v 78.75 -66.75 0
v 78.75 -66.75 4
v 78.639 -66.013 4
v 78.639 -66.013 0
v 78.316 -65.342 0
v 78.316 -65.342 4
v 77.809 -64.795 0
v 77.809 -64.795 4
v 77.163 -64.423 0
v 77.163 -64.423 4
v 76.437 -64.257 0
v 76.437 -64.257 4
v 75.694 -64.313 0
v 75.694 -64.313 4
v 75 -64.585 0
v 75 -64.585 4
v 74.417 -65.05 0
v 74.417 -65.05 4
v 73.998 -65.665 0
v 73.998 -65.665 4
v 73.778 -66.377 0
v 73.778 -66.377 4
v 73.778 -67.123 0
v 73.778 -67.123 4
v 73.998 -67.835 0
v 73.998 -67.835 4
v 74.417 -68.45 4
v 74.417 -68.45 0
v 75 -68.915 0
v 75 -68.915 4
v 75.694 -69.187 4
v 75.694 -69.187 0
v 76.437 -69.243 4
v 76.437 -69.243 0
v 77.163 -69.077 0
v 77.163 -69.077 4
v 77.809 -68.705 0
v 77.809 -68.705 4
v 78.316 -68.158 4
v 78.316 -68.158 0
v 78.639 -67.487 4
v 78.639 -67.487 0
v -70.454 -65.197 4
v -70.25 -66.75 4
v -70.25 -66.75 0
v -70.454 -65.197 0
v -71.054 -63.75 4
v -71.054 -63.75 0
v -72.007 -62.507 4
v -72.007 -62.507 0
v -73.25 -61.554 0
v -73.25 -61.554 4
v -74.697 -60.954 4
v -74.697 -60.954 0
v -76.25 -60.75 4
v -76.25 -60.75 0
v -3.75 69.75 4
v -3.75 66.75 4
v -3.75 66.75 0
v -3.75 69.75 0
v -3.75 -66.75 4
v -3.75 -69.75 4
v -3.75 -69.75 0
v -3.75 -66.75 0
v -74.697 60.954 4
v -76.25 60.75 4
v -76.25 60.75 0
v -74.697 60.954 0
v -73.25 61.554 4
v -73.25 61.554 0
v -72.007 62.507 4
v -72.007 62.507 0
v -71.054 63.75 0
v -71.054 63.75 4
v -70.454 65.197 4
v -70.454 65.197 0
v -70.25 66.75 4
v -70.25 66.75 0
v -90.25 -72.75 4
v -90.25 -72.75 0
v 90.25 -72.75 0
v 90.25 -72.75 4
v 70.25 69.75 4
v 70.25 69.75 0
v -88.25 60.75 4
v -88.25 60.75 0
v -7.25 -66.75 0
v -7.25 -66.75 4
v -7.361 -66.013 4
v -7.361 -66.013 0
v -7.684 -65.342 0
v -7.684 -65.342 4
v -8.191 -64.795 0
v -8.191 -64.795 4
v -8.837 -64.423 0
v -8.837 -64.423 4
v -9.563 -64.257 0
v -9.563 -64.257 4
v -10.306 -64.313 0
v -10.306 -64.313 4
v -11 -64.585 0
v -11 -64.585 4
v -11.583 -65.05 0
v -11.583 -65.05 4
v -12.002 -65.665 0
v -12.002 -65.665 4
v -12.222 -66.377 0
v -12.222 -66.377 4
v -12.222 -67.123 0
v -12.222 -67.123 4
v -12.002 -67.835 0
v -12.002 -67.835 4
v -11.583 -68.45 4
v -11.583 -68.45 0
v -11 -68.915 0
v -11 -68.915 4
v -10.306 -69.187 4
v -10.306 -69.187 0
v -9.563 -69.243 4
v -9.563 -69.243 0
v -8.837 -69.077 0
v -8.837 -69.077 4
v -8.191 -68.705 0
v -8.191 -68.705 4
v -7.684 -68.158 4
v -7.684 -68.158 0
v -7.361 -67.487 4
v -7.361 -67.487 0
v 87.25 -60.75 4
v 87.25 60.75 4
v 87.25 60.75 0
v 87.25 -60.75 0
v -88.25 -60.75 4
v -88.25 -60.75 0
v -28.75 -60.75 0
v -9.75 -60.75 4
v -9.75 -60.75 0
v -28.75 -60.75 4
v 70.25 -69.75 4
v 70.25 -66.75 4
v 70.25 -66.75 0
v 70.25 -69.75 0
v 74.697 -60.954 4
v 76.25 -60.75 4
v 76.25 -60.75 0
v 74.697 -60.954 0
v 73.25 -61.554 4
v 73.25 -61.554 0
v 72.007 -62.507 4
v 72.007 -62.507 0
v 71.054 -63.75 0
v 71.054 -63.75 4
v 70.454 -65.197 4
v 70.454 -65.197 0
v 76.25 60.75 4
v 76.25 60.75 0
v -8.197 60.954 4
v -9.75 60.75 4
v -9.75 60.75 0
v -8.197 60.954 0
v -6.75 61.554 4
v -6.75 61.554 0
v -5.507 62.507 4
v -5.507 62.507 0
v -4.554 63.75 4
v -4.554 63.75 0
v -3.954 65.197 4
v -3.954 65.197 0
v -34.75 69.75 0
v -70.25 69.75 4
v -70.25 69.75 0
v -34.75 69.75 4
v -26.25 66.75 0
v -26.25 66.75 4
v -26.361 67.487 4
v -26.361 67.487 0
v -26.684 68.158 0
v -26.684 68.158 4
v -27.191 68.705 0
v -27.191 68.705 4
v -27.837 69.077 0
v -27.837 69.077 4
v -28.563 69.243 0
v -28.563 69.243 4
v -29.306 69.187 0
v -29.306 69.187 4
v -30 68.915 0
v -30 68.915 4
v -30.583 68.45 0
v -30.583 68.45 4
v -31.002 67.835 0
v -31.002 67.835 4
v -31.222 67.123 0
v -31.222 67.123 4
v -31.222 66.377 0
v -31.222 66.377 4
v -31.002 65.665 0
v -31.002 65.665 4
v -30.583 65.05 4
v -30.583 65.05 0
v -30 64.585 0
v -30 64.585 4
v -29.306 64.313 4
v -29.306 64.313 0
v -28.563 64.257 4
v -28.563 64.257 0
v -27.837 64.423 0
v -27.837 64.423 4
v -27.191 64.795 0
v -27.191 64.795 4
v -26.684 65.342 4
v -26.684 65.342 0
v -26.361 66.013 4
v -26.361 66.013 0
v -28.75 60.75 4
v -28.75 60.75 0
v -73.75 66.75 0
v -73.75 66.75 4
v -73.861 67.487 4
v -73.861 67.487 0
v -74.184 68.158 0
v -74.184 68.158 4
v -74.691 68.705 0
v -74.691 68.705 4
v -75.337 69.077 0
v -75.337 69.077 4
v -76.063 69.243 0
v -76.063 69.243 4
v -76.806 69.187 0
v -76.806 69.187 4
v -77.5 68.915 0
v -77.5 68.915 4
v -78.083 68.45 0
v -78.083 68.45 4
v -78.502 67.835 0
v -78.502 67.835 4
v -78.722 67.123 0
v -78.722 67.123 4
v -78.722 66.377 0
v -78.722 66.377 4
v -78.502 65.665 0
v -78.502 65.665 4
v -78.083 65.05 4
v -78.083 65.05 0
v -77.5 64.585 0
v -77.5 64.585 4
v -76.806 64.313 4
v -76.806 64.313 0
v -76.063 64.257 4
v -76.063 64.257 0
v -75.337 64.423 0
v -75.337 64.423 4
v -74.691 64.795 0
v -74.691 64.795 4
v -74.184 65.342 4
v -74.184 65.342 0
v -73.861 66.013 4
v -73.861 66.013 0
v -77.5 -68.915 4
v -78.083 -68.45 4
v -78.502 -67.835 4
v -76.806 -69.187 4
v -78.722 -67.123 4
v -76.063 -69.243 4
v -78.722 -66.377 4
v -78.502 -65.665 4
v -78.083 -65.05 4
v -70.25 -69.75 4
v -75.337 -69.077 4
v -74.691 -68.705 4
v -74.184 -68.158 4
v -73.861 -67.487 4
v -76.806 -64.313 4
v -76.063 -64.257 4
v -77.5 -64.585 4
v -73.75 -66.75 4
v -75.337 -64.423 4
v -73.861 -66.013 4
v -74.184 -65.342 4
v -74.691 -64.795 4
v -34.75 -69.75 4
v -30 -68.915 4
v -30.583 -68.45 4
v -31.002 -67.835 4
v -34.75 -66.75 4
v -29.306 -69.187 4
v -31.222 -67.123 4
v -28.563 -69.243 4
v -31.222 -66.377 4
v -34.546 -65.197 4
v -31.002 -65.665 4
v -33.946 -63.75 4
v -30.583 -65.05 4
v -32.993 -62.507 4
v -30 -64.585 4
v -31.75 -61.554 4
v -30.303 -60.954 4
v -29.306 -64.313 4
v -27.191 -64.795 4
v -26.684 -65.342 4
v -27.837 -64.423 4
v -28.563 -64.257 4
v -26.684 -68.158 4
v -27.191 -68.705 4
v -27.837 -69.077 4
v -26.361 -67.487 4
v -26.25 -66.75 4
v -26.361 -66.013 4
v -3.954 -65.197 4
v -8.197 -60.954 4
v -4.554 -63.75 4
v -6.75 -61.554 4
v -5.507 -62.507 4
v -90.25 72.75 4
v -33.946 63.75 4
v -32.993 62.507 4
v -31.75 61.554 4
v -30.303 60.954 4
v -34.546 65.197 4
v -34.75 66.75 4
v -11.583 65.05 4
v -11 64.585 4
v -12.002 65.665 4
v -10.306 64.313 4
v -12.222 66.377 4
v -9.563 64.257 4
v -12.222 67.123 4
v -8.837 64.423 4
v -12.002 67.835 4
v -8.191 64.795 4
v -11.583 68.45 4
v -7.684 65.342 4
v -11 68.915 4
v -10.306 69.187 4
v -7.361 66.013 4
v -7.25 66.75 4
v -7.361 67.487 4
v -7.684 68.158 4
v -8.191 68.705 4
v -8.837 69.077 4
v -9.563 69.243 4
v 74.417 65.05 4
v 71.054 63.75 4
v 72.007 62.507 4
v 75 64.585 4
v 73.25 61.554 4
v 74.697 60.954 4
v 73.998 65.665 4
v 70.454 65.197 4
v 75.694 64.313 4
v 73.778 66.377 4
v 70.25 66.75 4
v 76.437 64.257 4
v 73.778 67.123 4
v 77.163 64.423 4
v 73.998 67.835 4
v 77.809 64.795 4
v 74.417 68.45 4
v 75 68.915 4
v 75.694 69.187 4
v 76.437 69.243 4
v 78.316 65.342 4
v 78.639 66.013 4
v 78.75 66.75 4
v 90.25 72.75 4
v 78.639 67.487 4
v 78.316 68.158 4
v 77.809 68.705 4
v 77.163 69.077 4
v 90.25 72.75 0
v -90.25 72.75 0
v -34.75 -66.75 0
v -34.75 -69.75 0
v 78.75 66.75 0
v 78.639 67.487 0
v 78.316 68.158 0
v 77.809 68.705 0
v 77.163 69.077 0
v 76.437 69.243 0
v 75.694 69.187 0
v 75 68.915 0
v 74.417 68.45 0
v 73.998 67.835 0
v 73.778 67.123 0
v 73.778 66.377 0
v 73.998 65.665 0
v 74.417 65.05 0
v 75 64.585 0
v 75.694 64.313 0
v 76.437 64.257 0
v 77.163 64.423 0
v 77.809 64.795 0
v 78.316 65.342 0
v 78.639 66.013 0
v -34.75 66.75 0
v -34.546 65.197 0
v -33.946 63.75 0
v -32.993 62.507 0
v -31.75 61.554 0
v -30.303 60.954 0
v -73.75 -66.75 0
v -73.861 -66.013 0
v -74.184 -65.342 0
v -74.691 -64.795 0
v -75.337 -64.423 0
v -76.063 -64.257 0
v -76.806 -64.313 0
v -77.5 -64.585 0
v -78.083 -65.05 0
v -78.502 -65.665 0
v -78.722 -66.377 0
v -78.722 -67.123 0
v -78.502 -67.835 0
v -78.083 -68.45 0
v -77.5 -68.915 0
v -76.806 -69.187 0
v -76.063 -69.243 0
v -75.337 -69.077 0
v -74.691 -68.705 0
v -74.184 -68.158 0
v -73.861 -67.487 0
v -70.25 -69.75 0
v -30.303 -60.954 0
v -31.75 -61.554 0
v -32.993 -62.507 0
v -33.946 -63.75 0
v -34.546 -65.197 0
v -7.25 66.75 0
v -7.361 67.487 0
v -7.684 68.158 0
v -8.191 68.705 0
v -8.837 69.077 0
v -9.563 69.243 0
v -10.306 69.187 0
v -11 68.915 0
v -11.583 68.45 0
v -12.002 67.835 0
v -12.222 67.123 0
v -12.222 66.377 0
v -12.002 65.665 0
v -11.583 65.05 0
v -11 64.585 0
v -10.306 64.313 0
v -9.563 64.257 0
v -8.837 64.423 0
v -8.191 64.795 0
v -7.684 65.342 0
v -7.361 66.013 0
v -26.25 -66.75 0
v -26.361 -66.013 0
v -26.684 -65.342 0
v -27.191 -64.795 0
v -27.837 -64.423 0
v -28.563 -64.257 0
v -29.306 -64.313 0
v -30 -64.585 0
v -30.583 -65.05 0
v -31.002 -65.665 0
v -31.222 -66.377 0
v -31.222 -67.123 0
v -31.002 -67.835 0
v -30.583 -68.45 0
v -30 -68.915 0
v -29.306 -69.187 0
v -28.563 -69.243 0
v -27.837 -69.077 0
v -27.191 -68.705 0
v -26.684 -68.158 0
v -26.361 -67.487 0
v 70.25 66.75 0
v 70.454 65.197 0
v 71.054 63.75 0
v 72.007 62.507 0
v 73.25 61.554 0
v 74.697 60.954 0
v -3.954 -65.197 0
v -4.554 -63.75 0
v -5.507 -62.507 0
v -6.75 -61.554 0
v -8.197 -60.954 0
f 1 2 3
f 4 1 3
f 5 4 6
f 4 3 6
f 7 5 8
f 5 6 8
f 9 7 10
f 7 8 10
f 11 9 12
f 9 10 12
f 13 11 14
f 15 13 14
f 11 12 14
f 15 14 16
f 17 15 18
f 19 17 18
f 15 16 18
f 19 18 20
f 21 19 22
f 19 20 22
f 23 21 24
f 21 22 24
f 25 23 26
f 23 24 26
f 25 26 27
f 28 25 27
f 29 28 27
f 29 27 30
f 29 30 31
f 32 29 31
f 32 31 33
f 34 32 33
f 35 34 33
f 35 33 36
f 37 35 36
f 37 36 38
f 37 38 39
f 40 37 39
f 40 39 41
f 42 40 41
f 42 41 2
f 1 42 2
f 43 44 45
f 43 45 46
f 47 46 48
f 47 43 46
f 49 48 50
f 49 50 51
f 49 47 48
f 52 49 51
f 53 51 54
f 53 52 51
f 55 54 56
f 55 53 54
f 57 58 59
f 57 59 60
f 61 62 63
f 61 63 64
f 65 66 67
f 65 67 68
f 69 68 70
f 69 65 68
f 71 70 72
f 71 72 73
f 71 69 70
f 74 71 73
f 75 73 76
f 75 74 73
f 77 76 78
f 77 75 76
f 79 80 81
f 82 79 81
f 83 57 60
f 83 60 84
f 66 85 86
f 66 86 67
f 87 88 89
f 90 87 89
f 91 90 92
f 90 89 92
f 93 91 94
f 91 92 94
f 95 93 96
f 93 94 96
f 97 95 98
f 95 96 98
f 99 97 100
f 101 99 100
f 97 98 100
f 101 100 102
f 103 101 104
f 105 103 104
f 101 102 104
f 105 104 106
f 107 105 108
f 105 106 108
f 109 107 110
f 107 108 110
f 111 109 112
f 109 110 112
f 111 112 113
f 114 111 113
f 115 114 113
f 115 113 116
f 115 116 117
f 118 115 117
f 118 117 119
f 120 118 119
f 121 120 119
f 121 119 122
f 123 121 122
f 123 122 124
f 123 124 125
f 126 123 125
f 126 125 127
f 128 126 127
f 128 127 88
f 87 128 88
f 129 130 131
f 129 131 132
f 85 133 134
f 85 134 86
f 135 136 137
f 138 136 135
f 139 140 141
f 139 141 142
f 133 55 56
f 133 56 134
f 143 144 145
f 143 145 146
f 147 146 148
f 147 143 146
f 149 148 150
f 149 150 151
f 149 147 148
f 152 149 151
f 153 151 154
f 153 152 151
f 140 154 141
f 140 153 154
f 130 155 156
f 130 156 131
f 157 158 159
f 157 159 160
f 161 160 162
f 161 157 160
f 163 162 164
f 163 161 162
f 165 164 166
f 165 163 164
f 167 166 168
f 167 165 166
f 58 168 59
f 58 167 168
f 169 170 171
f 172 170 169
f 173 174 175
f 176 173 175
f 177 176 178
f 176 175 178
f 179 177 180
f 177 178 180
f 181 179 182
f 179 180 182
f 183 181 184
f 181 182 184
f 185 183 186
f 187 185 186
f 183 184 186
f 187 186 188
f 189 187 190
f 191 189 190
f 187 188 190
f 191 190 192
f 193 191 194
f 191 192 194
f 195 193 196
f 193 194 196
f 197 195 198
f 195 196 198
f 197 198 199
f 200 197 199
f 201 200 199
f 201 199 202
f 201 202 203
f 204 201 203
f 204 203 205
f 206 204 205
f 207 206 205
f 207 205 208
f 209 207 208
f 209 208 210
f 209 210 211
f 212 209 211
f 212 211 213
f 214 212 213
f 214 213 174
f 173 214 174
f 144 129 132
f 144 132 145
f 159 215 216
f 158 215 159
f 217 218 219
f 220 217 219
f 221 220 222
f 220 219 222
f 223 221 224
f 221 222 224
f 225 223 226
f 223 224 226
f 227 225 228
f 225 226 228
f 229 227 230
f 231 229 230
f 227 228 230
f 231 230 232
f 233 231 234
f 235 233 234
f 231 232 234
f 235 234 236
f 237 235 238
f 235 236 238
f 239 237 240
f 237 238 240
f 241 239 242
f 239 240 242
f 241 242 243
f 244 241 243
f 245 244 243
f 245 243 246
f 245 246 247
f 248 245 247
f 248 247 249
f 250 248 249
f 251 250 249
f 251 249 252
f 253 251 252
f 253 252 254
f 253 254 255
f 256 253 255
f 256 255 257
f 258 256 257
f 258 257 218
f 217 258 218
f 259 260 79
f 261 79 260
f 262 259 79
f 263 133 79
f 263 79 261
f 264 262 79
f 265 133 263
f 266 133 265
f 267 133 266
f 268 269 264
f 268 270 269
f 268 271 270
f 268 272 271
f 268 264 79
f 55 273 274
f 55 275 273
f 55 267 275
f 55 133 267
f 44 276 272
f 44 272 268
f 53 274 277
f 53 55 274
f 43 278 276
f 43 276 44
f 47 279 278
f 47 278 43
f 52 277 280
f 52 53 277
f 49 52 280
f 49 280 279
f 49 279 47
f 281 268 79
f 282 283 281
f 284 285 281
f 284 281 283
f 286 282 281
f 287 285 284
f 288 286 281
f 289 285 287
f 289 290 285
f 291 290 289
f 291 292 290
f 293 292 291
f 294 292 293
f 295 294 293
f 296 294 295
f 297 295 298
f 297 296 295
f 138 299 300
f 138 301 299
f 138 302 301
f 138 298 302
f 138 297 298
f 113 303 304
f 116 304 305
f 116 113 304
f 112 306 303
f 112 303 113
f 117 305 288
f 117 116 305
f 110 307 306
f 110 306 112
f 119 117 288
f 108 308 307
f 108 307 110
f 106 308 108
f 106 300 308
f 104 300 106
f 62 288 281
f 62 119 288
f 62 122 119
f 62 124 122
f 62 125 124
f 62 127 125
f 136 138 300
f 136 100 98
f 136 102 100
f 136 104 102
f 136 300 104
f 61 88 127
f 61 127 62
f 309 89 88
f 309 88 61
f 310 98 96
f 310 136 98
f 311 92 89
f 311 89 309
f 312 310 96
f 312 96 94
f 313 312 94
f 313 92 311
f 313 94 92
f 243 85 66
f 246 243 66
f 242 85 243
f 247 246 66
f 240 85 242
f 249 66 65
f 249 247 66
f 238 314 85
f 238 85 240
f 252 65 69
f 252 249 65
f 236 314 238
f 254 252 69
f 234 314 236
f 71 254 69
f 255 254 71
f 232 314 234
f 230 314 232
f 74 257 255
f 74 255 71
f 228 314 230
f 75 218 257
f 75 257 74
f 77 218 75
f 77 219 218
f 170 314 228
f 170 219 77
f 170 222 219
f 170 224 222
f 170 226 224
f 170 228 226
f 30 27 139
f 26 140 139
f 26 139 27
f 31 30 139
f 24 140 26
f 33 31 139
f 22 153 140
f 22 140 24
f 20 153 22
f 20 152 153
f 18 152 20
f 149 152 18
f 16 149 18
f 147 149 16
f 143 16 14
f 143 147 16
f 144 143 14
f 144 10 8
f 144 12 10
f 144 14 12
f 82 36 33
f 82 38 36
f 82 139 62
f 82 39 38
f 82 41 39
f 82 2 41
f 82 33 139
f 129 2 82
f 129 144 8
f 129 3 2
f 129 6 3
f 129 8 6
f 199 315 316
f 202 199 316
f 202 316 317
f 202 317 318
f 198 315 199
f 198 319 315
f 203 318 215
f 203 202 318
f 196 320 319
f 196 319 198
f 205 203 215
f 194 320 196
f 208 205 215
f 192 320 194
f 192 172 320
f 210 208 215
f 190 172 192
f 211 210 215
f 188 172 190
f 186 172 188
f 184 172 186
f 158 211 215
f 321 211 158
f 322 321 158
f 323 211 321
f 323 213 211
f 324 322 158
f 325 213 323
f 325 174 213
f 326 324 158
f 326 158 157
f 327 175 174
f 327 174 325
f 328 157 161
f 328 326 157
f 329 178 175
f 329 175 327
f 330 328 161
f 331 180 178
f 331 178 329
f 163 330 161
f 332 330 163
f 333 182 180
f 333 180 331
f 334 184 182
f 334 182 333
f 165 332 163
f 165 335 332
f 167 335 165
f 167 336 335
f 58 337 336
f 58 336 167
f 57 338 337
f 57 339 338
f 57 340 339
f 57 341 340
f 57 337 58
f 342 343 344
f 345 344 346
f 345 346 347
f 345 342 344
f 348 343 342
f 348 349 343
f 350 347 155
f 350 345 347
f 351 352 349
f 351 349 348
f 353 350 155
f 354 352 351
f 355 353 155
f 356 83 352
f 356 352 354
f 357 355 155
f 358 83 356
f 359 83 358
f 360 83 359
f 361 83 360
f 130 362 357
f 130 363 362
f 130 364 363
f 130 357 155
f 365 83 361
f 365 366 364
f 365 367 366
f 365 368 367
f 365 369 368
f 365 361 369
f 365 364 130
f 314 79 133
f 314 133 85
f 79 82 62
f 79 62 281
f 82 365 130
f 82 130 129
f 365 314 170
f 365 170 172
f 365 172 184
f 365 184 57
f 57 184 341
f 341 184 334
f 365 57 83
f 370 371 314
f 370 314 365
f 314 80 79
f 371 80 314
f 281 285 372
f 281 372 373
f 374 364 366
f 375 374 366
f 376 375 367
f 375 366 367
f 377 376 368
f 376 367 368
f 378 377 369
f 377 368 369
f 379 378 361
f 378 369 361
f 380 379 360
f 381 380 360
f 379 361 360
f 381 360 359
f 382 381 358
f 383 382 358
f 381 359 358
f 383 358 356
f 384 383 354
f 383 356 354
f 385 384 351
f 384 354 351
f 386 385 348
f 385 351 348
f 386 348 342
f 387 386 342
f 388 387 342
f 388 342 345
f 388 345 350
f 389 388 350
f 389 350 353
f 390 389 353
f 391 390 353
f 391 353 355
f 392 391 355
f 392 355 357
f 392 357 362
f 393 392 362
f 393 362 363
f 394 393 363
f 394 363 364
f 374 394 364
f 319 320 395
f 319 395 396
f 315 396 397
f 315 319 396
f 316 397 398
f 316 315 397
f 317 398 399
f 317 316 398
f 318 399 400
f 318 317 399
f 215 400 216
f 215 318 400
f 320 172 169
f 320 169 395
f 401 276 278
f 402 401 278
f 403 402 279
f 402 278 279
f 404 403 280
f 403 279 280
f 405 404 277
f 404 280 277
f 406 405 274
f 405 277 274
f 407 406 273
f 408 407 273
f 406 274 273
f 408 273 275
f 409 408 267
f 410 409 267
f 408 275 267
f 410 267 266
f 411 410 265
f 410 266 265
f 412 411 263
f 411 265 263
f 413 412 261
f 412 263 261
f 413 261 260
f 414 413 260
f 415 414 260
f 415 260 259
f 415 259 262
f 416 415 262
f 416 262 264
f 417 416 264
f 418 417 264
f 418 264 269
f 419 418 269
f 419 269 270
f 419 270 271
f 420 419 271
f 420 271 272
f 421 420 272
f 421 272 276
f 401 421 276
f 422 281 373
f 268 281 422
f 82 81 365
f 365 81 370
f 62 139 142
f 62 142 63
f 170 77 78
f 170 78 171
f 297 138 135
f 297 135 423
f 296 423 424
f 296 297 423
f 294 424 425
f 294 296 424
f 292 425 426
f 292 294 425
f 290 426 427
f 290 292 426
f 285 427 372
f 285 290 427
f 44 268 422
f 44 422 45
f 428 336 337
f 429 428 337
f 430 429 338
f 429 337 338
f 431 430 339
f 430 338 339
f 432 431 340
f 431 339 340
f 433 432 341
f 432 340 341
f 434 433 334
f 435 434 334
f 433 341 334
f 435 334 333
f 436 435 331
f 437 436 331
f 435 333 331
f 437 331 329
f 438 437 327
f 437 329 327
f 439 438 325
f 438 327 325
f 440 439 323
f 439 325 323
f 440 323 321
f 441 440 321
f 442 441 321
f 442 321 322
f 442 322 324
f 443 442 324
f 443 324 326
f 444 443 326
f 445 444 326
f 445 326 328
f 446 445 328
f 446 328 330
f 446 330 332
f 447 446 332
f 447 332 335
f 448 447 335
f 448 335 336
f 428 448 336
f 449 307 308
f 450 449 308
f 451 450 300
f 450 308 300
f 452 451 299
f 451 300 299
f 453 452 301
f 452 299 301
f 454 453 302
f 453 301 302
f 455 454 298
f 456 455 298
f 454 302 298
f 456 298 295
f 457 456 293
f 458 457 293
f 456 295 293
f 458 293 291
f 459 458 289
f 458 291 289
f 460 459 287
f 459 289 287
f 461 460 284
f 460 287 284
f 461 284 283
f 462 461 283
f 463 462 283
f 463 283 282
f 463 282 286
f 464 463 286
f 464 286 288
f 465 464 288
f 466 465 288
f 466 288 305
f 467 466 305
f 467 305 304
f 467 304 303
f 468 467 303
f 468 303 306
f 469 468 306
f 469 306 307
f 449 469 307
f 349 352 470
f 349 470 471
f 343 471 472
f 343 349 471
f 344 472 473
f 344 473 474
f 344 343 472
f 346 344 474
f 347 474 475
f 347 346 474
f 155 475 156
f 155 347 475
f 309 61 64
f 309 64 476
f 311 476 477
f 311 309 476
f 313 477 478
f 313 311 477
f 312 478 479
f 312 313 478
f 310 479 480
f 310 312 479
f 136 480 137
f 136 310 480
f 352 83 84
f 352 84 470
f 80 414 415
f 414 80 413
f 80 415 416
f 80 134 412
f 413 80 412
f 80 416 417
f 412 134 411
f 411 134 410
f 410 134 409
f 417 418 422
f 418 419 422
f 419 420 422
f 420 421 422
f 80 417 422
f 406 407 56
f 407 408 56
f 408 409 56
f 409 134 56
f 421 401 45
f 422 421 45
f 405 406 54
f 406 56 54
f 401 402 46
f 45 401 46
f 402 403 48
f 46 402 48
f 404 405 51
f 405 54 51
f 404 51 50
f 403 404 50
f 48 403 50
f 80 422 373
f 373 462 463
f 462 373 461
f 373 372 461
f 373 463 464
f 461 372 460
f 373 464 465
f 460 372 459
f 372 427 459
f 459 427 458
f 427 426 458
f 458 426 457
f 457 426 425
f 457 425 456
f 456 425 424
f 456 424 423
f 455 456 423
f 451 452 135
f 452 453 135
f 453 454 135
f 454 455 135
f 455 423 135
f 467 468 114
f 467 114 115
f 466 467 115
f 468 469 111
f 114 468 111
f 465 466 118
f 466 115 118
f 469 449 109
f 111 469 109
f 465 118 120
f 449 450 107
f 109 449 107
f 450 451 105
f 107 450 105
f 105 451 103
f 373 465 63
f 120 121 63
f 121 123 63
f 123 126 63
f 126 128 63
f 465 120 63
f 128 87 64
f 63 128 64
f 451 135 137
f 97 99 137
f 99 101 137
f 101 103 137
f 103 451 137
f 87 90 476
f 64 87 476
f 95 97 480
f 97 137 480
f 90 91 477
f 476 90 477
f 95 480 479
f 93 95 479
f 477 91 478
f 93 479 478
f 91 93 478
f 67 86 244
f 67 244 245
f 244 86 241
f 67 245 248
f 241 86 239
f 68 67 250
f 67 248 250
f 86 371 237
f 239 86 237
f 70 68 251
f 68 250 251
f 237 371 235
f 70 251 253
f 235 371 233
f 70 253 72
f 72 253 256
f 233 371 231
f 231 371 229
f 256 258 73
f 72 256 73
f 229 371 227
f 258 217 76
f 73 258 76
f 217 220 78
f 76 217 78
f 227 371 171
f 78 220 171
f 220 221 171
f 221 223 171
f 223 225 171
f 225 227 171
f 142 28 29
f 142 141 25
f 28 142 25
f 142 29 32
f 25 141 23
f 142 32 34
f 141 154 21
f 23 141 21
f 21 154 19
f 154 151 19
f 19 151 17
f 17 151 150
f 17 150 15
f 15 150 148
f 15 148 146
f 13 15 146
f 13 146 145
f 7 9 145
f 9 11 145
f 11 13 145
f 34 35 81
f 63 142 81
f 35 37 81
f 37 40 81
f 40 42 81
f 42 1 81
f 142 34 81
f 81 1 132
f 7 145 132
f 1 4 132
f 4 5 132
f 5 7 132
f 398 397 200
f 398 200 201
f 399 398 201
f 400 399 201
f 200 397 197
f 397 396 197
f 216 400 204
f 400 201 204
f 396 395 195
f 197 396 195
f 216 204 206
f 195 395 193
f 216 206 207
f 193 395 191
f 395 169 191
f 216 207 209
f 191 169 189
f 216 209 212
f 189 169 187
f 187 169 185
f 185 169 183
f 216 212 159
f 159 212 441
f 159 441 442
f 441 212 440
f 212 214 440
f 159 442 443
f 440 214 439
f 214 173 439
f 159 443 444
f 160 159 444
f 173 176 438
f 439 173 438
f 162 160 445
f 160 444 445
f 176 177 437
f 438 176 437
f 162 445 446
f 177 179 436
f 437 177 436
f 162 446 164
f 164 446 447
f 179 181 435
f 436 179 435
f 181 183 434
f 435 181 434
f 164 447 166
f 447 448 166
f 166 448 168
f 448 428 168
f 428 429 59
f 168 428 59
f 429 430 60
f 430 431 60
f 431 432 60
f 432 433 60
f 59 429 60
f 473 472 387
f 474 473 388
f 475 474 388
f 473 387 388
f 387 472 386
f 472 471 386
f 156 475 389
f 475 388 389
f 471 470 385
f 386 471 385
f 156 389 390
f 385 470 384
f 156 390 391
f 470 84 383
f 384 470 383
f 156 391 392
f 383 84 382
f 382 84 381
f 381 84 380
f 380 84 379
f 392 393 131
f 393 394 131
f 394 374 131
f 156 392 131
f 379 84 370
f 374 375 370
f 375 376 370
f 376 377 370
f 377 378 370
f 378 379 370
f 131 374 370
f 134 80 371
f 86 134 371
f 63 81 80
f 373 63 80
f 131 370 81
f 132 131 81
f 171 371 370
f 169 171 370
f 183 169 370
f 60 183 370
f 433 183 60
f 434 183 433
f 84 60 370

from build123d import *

# Parameters (mm, degrees)
SKETCH2_W           = 180.5
SKETCH2_H           = 145.5
BOSS_EXTRUDE1_DEPTH = 4
CUT_EXTRUDE2_REACH  = 6
SKETCH5_R           = 2.5


with BuildPart() as part:
    # Sketch2 → Boss-Extrude1 (new body)
    with BuildSketch(Plane.XY):
        Rectangle(SKETCH2_W, SKETCH2_H)
    extrude(amount=BOSS_EXTRUDE1_DEPTH)

    # Sketch5 → Cut-Extrude2 (cut, up to next)
    with BuildSketch(Plane.XY.offset(4), mode=Mode.PRIVATE) as cut_extrude2_sk1:
        with Locations((-76.25, 66.75)):
            Circle(SKETCH5_R)
    cut_extrude2_tool1 = extrude(cut_extrude2_sk1.sketch, amount=-CUT_EXTRUDE2_REACH, mode=Mode.PRIVATE) & part.part
    add(cut_extrude2_tool1.solids().sort_by_distance((-76.25, 66.75, 4))[0], mode=Mode.SUBTRACT)
    # Sketch5 → Cut-Extrude2 (cut, up to next)
    with BuildSketch(Plane.XY.offset(4), mode=Mode.PRIVATE) as cut_extrude2_sk2:
        with Locations((-28.75, 66.75)):
            Circle(SKETCH5_R)
    cut_extrude2_tool2 = extrude(cut_extrude2_sk2.sketch, amount=-CUT_EXTRUDE2_REACH, mode=Mode.PRIVATE) & part.part
    add(cut_extrude2_tool2.solids().sort_by_distance((-28.75, 66.75, 4))[0], mode=Mode.SUBTRACT)
    # Sketch5 → Cut-Extrude2 (cut, up to next)
    with BuildSketch(Plane.XY.offset(4), mode=Mode.PRIVATE) as cut_extrude2_sk3:
        with Locations((-9.75, 66.75)):
            Circle(SKETCH5_R)
    cut_extrude2_tool3 = extrude(cut_extrude2_sk3.sketch, amount=-CUT_EXTRUDE2_REACH, mode=Mode.PRIVATE) & part.part
    add(cut_extrude2_tool3.solids().sort_by_distance((-9.75, 66.75, 4))[0], mode=Mode.SUBTRACT)
    # Sketch5 → Cut-Extrude2 (cut, up to next)
    with BuildSketch(Plane.XY.offset(4), mode=Mode.PRIVATE) as cut_extrude2_sk4:
        with Locations((76.25, 66.75)):
            Circle(SKETCH5_R)
    cut_extrude2_tool4 = extrude(cut_extrude2_sk4.sketch, amount=-CUT_EXTRUDE2_REACH, mode=Mode.PRIVATE) & part.part
    add(cut_extrude2_tool4.solids().sort_by_distance((76.25, 66.75, 4))[0], mode=Mode.SUBTRACT)
    # Sketch5 → Cut-Extrude2 (cut, up to next)
    with BuildSketch(Plane.XY.offset(4), mode=Mode.PRIVATE) as cut_extrude2_sk5:
        with Locations((76.25, -66.75)):
            Circle(SKETCH5_R)
    cut_extrude2_tool5 = extrude(cut_extrude2_sk5.sketch, amount=-CUT_EXTRUDE2_REACH, mode=Mode.PRIVATE) & part.part
    add(cut_extrude2_tool5.solids().sort_by_distance((76.25, -66.75, 4))[0], mode=Mode.SUBTRACT)
    # Sketch5 → Cut-Extrude2 (cut, up to next)
    with BuildSketch(Plane.XY.offset(4), mode=Mode.PRIVATE) as cut_extrude2_sk6:
        with Locations((-9.75, -66.75)):
            Circle(SKETCH5_R)
    cut_extrude2_tool6 = extrude(cut_extrude2_sk6.sketch, amount=-CUT_EXTRUDE2_REACH, mode=Mode.PRIVATE) & part.part
    add(cut_extrude2_tool6.solids().sort_by_distance((-9.75, -66.75, 4))[0], mode=Mode.SUBTRACT)
    # Sketch5 → Cut-Extrude2 (cut, up to next)
    with BuildSketch(Plane.XY.offset(4), mode=Mode.PRIVATE) as cut_extrude2_sk7:
        with Locations((-28.75, -66.75)):
            Circle(SKETCH5_R)
    cut_extrude2_tool7 = extrude(cut_extrude2_sk7.sketch, amount=-CUT_EXTRUDE2_REACH, mode=Mode.PRIVATE) & part.part
    add(cut_extrude2_tool7.solids().sort_by_distance((-28.75, -66.75, 4))[0], mode=Mode.SUBTRACT)
    # Sketch5 → Cut-Extrude2 (cut, up to next)
    with BuildSketch(Plane.XY.offset(4), mode=Mode.PRIVATE) as cut_extrude2_sk8:
        with Locations((-76.25, -66.75)):
            Circle(SKETCH5_R)
    cut_extrude2_tool8 = extrude(cut_extrude2_sk8.sketch, amount=-CUT_EXTRUDE2_REACH, mode=Mode.PRIVATE) & part.part
    add(cut_extrude2_tool8.solids().sort_by_distance((-76.25, -66.75, 4))[0], mode=Mode.SUBTRACT)
    # Sketch5 → Cut-Extrude2 (cut, up to next)
    with BuildSketch(Plane.XY.offset(4), mode=Mode.PRIVATE) as cut_extrude2_sk9:
        with BuildLine():
            Line((-70.25, 69.75), (-34.75, 69.75))
            Line((-34.75, 69.75), (-34.75, 66.75))
            ThreePointArc((-34.75, 66.75), (-32.992640687, 62.507359313), (-28.75, 60.75))
            Line((-28.75, 60.75), (-9.75, 60.75))
            ThreePointArc((-9.75, 60.75), (-5.507359313, 62.507359313), (-3.75, 66.75))
            Line((-3.75, 66.75), (-3.75, 69.75))
            Line((-3.75, 69.75), (70.25, 69.75))
            Line((70.25, 69.75), (70.25, 66.75))
            ThreePointArc((70.25, 66.75), (72.007359313, 62.507359313), (76.25, 60.75))
            Line((76.25, 60.75), (87.25, 60.75))
            Line((87.25, 60.75), (87.25, -60.75))
            Line((87.25, -60.75), (76.25, -60.75))
            ThreePointArc((76.25, -60.75), (72.007359313, -62.507359313), (70.25, -66.75))
            Line((70.25, -66.75), (70.25, -69.75))
            Line((70.25, -69.75), (-3.75, -69.75))
            Line((-3.75, -69.75), (-3.75, -66.75))
            ThreePointArc((-3.75, -66.75), (-5.507359313, -62.507359313), (-9.75, -60.75))
            Line((-9.75, -60.75), (-28.75, -60.75))
            ThreePointArc((-28.75, -60.75), (-32.992640687, -62.507359313), (-34.75, -66.75))
            Line((-34.75, -66.75), (-34.75, -69.75))
            Line((-34.75, -69.75), (-70.25, -69.75))
            Line((-70.25, -69.75), (-70.25, -66.75))
            ThreePointArc((-70.25, -66.75), (-72.007359313, -62.507359313), (-76.25, -60.75))
            Line((-76.25, -60.75), (-88.25, -60.75))
            Line((-88.25, -60.75), (-88.25, 60.75))
            Line((-88.25, 60.75), (-76.25, 60.75))
            ThreePointArc((-76.25, 60.75), (-72.007359313, 62.507359313), (-70.25, 66.75))
            Line((-70.25, 66.75), (-70.25, 69.75))
        make_face()
    cut_extrude2_tool9 = extrude(cut_extrude2_sk9.sketch, amount=-CUT_EXTRUDE2_REACH, mode=Mode.PRIVATE) & part.part
    add(cut_extrude2_tool9.solids().sort_by_distance((-0.02205, 0, 4))[0], mode=Mode.SUBTRACT)


solid = part.part
